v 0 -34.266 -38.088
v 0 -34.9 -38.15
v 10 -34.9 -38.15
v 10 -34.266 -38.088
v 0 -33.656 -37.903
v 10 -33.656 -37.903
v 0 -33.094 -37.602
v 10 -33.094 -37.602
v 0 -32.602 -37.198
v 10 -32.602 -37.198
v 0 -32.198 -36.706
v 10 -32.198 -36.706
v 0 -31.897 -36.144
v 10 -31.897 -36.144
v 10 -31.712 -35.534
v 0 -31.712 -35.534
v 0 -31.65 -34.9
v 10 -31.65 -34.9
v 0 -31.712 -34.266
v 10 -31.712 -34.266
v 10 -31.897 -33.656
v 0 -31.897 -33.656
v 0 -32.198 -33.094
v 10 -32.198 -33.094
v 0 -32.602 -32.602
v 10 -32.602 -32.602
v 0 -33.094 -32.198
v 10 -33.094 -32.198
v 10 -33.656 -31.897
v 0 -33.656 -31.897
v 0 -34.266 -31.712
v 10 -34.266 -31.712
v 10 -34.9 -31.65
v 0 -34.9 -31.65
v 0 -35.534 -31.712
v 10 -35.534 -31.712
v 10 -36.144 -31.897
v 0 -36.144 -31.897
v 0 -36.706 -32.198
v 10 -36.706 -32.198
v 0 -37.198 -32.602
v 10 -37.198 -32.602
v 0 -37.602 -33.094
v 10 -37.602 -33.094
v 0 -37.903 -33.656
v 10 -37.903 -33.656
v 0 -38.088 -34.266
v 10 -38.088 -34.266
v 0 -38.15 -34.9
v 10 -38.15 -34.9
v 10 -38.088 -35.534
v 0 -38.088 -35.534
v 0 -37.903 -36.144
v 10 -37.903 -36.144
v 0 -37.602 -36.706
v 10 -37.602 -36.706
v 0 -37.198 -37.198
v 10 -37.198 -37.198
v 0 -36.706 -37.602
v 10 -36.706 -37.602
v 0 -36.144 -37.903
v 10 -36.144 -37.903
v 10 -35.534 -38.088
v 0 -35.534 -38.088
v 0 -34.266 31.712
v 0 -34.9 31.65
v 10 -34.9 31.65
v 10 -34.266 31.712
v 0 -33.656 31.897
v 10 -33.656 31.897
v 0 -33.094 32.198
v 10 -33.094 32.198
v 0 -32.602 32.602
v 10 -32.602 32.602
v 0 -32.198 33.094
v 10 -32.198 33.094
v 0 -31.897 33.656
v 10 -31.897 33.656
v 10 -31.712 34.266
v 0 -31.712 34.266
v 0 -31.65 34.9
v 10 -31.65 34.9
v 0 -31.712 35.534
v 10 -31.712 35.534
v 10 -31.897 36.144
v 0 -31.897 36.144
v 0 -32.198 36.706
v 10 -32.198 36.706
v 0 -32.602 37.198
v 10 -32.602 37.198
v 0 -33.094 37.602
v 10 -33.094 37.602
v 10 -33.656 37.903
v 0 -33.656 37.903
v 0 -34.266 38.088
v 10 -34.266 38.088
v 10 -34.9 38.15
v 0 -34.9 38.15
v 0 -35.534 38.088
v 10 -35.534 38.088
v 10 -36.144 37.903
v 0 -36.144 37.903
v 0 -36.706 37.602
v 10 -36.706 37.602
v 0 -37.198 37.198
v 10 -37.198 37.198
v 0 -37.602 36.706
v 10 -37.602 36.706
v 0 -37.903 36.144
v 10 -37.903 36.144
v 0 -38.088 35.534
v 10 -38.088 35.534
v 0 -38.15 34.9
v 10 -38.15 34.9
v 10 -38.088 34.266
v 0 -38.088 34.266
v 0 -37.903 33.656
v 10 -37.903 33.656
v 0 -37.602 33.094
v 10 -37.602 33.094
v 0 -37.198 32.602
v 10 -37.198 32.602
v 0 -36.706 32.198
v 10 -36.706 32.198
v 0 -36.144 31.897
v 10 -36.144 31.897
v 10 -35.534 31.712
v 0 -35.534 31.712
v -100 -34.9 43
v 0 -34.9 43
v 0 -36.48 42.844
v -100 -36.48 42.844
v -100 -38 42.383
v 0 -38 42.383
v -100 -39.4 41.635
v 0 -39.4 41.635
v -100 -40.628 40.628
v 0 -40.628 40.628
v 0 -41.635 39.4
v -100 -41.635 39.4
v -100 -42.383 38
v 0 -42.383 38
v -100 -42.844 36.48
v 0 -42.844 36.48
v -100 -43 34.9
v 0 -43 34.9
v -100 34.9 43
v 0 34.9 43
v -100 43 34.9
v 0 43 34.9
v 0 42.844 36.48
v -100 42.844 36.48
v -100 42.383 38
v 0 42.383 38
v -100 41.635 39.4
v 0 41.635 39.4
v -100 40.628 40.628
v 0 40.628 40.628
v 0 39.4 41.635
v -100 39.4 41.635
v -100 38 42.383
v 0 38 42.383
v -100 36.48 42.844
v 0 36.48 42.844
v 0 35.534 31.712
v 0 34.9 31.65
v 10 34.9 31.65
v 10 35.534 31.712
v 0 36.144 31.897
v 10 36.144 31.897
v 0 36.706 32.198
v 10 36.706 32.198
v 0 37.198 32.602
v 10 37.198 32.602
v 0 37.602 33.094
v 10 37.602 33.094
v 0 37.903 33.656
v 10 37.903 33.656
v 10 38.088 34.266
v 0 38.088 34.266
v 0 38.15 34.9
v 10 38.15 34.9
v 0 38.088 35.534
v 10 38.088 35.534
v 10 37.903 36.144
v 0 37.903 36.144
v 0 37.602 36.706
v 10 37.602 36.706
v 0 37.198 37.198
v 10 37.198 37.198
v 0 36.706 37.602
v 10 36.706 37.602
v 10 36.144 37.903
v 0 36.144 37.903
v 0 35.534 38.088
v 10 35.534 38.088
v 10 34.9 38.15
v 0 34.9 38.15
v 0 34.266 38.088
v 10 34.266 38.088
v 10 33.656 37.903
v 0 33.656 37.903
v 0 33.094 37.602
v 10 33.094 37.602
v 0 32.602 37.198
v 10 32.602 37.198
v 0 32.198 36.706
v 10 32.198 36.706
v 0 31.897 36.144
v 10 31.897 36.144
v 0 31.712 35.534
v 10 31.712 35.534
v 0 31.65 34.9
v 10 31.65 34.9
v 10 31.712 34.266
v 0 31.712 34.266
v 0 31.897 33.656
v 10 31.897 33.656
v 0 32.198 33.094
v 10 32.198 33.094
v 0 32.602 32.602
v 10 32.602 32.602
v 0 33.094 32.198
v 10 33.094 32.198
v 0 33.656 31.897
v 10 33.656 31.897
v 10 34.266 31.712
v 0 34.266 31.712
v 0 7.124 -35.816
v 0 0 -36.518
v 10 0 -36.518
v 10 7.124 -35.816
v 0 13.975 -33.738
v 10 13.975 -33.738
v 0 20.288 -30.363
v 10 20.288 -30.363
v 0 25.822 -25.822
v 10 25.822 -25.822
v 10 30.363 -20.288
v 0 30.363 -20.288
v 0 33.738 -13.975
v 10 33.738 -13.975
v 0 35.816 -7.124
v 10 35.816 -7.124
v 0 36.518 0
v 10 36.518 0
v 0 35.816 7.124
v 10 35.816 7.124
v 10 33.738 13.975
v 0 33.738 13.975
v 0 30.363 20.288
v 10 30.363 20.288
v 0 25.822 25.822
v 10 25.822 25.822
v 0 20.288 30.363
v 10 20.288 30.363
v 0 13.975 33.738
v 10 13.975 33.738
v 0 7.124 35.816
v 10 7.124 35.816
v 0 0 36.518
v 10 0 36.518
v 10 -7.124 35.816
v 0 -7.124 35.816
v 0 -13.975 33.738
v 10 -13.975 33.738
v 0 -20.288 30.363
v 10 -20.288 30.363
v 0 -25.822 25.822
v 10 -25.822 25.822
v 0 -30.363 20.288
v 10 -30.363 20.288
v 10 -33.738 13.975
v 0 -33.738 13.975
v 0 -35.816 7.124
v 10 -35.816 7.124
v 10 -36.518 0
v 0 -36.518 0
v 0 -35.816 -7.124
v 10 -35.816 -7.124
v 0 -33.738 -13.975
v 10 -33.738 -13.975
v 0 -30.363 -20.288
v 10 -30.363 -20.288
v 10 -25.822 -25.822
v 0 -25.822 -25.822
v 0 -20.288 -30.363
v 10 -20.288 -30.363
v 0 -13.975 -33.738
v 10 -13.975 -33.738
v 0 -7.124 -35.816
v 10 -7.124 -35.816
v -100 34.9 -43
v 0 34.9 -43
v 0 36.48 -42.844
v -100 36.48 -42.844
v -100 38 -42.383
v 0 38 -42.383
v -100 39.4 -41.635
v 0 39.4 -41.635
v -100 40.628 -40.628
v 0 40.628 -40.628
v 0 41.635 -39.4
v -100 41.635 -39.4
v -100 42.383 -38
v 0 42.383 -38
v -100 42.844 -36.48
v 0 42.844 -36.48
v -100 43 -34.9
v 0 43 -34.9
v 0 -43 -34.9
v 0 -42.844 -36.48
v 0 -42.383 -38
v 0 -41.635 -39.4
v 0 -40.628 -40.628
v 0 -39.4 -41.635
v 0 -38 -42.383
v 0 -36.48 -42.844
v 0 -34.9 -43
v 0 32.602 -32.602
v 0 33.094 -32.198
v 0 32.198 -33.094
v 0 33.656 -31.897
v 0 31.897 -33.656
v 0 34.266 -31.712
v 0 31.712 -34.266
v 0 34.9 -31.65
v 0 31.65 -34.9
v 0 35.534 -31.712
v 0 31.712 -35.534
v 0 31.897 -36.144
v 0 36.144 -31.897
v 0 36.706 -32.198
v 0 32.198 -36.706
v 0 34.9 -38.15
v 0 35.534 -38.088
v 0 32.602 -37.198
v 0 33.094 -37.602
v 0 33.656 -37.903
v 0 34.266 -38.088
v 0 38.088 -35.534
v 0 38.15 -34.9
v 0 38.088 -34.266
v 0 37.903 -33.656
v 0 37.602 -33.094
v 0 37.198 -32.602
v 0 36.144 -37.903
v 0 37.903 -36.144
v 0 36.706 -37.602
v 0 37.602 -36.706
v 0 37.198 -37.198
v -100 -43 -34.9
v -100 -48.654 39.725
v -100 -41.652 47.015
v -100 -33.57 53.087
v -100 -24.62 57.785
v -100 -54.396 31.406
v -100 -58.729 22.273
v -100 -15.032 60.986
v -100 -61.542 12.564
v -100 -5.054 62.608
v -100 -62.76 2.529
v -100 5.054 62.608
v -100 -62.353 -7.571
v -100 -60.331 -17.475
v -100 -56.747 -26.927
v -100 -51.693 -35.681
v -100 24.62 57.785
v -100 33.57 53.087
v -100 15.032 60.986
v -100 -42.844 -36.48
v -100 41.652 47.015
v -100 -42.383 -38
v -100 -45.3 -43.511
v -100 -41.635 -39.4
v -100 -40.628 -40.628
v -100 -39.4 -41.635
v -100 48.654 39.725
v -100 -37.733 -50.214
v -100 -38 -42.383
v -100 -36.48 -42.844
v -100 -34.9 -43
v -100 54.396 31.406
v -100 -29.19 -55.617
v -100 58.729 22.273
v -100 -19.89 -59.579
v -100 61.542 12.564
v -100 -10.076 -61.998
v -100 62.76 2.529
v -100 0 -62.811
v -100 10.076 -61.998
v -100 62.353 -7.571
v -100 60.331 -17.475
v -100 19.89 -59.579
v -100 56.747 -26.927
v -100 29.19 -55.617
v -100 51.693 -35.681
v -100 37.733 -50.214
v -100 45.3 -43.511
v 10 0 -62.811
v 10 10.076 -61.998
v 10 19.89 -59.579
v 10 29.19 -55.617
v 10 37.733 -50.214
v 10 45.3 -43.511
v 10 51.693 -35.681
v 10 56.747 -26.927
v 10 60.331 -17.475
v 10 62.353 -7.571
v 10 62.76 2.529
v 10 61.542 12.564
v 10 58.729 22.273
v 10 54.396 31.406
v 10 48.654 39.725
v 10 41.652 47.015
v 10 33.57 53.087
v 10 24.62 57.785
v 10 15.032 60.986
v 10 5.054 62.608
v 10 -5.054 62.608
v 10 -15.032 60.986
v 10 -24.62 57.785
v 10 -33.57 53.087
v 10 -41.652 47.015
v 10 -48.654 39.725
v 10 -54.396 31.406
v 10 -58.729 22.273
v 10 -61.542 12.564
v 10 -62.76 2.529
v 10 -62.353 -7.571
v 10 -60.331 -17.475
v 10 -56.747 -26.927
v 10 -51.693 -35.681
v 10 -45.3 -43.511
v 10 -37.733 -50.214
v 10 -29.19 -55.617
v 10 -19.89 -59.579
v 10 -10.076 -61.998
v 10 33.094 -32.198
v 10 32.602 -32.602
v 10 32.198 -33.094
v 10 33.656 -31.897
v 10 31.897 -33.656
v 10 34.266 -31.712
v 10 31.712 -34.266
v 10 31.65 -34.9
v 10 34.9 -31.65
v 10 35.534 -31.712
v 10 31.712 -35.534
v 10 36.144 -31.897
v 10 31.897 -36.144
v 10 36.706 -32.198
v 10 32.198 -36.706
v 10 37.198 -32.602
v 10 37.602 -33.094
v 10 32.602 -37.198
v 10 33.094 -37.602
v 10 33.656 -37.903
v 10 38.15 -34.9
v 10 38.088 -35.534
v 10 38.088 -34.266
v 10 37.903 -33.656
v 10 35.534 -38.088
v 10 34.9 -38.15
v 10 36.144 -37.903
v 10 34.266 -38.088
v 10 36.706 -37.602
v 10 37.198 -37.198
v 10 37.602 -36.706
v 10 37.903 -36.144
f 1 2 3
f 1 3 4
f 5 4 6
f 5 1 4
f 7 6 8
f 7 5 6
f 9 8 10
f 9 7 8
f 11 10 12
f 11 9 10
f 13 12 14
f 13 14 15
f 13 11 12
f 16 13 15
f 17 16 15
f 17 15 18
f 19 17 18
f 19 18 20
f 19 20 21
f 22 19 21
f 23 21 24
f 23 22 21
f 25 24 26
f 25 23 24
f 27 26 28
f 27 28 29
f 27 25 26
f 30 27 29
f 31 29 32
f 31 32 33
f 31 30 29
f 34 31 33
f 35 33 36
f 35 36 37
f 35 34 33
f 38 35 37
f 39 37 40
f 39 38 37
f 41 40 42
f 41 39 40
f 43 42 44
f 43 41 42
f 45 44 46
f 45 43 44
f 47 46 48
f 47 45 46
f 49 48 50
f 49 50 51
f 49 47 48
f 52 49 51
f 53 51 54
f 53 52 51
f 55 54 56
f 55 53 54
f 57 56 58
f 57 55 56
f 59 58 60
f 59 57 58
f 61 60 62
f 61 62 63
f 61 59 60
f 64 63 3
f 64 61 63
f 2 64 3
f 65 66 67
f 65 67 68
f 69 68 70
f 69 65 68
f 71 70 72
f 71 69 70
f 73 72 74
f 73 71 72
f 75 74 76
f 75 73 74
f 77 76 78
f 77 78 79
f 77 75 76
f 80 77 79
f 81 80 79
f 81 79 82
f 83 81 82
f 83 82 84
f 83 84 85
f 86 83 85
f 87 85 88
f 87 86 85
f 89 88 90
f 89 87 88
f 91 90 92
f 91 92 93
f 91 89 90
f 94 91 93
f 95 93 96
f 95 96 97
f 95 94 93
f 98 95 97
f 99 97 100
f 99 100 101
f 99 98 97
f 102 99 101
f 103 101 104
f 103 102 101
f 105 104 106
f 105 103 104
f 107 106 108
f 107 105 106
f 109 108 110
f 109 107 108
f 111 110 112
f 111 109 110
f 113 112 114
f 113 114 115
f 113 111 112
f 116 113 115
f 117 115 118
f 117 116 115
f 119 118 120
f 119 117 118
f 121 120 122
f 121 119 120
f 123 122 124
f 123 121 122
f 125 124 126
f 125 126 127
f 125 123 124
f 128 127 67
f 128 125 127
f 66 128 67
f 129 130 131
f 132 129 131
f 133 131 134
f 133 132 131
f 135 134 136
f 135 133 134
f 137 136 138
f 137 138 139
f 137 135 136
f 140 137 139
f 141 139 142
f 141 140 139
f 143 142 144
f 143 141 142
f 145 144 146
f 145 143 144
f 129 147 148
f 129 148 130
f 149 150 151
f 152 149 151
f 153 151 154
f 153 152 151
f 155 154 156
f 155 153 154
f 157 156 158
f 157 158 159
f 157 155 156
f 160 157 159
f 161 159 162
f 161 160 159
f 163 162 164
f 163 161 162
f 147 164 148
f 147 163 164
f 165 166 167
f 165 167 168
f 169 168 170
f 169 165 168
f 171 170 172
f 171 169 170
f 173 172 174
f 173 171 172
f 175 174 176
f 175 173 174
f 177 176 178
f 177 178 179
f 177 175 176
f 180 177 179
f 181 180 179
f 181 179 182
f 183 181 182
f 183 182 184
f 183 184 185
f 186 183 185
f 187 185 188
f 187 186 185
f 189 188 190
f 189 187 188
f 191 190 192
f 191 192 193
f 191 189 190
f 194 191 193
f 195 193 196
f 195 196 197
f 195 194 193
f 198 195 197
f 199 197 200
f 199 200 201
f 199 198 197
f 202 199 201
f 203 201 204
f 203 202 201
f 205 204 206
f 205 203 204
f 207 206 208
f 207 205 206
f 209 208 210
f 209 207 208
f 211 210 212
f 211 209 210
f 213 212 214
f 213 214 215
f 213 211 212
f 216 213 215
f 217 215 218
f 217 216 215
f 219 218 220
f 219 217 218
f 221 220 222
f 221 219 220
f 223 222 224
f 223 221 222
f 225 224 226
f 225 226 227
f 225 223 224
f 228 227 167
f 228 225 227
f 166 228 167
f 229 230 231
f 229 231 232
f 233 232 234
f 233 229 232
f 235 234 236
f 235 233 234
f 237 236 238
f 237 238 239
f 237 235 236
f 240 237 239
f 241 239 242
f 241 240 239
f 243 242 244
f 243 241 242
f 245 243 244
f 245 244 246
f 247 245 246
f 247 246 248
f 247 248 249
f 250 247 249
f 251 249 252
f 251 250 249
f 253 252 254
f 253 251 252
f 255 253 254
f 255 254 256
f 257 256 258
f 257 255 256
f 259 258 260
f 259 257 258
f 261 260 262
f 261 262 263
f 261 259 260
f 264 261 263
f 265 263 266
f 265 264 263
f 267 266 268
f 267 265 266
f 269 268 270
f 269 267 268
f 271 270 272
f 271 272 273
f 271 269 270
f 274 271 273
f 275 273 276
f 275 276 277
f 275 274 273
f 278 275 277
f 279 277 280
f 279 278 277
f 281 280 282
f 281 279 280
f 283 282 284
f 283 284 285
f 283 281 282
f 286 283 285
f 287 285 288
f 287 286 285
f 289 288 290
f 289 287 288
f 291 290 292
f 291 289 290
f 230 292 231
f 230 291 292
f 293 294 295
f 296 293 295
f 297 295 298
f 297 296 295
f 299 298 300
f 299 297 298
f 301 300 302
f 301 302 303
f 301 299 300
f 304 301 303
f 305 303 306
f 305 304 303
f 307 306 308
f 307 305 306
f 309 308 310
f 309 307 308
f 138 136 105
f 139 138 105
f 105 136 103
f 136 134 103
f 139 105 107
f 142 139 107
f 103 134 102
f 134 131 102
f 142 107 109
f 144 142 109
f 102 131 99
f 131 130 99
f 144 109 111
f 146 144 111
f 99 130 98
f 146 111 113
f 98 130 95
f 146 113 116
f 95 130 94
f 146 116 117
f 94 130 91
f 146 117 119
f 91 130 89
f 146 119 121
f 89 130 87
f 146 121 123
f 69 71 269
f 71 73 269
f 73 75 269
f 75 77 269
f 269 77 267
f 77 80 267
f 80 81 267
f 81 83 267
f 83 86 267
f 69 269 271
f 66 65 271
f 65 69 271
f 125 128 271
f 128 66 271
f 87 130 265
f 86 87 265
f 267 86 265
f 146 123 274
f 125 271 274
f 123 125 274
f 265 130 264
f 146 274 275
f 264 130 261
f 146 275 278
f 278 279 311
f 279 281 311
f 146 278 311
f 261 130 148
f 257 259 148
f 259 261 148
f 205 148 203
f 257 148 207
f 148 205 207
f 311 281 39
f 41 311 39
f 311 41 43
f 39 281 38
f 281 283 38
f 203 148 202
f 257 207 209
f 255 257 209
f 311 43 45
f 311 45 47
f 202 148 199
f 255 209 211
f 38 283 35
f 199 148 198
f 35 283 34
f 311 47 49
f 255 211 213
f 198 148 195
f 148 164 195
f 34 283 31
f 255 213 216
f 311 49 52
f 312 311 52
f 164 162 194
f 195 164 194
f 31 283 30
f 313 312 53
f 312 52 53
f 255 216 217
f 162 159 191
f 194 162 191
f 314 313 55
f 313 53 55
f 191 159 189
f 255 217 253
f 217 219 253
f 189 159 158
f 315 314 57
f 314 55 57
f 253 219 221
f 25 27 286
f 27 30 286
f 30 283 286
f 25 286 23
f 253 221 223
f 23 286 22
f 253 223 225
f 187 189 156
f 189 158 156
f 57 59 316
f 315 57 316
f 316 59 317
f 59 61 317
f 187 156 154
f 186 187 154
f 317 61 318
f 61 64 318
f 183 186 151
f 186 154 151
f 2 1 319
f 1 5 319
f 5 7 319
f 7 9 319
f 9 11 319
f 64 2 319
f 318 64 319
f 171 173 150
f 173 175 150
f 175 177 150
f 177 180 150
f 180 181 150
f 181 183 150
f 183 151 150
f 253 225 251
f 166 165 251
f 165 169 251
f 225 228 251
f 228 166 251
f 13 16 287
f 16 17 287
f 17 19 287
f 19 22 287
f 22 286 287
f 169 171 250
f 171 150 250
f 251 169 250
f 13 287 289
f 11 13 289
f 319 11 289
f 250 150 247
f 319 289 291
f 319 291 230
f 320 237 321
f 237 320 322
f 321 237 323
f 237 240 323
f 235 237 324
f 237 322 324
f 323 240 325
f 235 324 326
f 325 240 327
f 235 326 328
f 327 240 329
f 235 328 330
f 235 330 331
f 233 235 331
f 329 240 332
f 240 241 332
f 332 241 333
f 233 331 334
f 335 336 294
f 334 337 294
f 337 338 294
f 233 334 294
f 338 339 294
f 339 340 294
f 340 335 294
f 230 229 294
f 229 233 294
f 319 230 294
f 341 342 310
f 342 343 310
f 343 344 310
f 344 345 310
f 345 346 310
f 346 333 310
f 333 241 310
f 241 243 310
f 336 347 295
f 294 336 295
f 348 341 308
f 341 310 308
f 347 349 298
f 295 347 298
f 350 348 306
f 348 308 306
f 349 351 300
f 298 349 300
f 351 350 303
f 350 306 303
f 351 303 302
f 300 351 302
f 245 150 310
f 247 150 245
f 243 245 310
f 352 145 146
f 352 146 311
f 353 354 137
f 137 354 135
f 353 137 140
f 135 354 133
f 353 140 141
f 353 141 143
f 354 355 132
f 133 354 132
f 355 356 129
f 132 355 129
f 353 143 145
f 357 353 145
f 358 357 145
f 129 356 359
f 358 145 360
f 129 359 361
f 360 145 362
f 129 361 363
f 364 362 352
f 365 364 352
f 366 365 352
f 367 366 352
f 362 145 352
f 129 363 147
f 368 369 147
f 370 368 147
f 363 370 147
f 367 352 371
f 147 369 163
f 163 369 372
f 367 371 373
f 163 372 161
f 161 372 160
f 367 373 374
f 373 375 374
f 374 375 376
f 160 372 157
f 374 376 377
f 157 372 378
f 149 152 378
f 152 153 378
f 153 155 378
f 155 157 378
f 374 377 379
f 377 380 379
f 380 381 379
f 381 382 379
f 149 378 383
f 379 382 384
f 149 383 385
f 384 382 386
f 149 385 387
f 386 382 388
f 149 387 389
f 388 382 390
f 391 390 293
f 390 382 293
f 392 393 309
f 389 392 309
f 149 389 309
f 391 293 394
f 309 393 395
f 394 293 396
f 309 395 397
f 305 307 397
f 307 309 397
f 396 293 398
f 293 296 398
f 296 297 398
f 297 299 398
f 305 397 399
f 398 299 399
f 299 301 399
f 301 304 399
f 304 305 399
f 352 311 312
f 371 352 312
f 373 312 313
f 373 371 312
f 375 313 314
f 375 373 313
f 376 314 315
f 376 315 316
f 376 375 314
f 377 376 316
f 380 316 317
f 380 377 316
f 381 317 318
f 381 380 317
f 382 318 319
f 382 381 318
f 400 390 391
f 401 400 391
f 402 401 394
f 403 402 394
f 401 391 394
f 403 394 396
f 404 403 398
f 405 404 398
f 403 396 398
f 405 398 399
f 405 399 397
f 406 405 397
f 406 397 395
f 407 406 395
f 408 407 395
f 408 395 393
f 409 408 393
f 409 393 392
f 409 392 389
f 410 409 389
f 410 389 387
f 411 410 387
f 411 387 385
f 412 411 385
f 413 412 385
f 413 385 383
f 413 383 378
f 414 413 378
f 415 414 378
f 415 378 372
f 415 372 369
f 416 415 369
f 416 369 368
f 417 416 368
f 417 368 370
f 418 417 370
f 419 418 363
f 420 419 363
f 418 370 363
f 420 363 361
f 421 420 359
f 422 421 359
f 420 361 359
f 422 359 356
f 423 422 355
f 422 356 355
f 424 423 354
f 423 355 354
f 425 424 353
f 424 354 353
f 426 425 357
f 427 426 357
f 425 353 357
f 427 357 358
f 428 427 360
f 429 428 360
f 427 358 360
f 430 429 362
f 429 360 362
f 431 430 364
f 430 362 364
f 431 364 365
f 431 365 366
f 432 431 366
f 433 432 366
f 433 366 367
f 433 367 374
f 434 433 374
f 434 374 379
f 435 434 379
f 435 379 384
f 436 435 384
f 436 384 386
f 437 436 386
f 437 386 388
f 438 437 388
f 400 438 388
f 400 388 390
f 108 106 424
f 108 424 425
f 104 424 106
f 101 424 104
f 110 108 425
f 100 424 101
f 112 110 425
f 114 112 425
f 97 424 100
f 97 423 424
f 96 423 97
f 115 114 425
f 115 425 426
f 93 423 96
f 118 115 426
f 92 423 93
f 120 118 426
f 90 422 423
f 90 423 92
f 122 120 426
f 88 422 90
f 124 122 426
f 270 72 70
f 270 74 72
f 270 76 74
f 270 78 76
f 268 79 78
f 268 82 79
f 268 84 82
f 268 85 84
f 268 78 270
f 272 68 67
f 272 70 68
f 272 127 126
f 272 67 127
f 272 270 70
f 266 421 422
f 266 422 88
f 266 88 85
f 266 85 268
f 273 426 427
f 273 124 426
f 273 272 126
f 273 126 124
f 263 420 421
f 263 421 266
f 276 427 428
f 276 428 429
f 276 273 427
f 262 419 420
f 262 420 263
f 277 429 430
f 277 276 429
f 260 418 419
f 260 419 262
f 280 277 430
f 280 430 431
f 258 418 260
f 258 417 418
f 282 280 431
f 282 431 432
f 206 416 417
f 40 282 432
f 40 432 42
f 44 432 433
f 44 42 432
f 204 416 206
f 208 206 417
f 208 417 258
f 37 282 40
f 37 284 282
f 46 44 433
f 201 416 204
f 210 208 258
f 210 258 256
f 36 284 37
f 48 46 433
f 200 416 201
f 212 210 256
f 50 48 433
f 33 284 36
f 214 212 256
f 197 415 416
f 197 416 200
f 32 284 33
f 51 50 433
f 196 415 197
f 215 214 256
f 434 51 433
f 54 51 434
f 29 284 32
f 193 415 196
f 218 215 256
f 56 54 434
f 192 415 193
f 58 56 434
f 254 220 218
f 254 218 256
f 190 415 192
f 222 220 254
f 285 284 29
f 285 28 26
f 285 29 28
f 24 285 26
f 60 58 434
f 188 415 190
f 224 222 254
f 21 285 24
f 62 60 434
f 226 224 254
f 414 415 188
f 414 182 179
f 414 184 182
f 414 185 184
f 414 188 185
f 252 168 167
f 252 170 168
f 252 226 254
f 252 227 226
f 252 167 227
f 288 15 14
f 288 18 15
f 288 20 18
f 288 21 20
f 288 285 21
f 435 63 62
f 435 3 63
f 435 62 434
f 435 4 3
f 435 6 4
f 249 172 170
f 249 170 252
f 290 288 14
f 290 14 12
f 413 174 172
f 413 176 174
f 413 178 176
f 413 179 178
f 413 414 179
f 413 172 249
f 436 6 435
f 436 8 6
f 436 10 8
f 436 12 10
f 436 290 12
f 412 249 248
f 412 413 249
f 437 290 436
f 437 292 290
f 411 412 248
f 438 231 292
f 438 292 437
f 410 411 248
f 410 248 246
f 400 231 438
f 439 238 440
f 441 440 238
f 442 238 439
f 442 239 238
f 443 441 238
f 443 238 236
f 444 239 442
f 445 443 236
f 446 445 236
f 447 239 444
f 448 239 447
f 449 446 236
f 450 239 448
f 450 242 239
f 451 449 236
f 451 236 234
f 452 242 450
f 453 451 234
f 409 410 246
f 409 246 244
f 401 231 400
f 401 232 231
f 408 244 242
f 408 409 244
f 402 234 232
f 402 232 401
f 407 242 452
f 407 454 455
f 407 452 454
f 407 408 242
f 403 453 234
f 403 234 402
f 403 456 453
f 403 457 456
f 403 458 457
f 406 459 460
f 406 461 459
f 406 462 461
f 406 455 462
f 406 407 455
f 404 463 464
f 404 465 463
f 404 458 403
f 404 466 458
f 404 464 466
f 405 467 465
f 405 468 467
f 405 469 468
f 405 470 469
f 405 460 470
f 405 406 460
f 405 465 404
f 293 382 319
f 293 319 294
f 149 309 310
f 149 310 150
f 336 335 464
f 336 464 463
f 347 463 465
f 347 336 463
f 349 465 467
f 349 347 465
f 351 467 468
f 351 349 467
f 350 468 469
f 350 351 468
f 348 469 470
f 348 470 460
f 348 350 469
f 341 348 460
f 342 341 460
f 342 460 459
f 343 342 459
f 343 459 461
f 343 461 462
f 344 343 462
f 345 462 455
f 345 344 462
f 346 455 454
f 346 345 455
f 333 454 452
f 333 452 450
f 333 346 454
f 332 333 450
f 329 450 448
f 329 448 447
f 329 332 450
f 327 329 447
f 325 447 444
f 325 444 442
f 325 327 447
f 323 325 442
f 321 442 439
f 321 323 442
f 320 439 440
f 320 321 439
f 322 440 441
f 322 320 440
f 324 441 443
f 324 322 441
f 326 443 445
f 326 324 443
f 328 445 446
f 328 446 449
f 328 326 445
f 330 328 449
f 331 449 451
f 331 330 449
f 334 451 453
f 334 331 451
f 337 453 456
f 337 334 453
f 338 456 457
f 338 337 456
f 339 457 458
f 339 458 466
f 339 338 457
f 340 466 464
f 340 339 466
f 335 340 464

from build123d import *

# Parameters (mm, degrees)
SKETCH1_R           = 62.811183182
SKETCH1_R_2         = 3.25
SKETCH1_R_3         = 36.5175
BOSS_EXTRUDE1_DEPTH = 10
BOSS_EXTRUDE2_START = -100
SKETCH1_3_R         = 62.811183182
BOSS_EXTRUDE2_DEPTH = 100


with BuildPart() as part:
    # Sketch1 → Boss-Extrude1 (new body)
    with BuildSketch(Plane(origin=(0, 0, 0), x_dir=(0, 0, -1), z_dir=(1, 0, 0))):
        Circle(SKETCH1_R)
        with Locations((-34.9, -34.9)):
            Circle(SKETCH1_R_2, mode=Mode.SUBTRACT)
        with Locations((34.9, -34.9)):
            Circle(SKETCH1_R_2, mode=Mode.SUBTRACT)
        with Locations((-34.9, 34.9)):
            Circle(SKETCH1_R_2, mode=Mode.SUBTRACT)
        Circle(SKETCH1_R_3, mode=Mode.SUBTRACT)
        with Locations((34.9, 34.9)):
            Circle(SKETCH1_R_2, mode=Mode.SUBTRACT)
    extrude(amount=BOSS_EXTRUDE1_DEPTH)

    # Sketch1<3> → Boss-Extrude2 (add)
    with BuildSketch(Plane(origin=(0, 0, 0), x_dir=(0, 0, -1), z_dir=(1, 0, 0)).offset(BOSS_EXTRUDE2_START)):
        Circle(SKETCH1_3_R)
        with BuildLine():
            ThreePointArc((43, -34.9), (40.627564928, -40.627564928), (34.9, -43))
            Line((34.9, -43), (-34.9, -43))
            ThreePointArc((-34.9, -43), (-40.627564928, -40.627564928), (-43, -34.9))
            Line((-43, -34.9), (-43, 34.9))
            ThreePointArc((-43, 34.9), (-40.627564928, 40.627564928), (-34.9, 43))
            Line((-34.9, 43), (34.9, 43))
            ThreePointArc((34.9, 43), (40.627564928, 40.627564928), (43, 34.9))
            Line((43, 34.9), (43, -34.9))
        make_face(mode=Mode.SUBTRACT)
    extrude(amount=BOSS_EXTRUDE2_DEPTH)


solid = part.part
